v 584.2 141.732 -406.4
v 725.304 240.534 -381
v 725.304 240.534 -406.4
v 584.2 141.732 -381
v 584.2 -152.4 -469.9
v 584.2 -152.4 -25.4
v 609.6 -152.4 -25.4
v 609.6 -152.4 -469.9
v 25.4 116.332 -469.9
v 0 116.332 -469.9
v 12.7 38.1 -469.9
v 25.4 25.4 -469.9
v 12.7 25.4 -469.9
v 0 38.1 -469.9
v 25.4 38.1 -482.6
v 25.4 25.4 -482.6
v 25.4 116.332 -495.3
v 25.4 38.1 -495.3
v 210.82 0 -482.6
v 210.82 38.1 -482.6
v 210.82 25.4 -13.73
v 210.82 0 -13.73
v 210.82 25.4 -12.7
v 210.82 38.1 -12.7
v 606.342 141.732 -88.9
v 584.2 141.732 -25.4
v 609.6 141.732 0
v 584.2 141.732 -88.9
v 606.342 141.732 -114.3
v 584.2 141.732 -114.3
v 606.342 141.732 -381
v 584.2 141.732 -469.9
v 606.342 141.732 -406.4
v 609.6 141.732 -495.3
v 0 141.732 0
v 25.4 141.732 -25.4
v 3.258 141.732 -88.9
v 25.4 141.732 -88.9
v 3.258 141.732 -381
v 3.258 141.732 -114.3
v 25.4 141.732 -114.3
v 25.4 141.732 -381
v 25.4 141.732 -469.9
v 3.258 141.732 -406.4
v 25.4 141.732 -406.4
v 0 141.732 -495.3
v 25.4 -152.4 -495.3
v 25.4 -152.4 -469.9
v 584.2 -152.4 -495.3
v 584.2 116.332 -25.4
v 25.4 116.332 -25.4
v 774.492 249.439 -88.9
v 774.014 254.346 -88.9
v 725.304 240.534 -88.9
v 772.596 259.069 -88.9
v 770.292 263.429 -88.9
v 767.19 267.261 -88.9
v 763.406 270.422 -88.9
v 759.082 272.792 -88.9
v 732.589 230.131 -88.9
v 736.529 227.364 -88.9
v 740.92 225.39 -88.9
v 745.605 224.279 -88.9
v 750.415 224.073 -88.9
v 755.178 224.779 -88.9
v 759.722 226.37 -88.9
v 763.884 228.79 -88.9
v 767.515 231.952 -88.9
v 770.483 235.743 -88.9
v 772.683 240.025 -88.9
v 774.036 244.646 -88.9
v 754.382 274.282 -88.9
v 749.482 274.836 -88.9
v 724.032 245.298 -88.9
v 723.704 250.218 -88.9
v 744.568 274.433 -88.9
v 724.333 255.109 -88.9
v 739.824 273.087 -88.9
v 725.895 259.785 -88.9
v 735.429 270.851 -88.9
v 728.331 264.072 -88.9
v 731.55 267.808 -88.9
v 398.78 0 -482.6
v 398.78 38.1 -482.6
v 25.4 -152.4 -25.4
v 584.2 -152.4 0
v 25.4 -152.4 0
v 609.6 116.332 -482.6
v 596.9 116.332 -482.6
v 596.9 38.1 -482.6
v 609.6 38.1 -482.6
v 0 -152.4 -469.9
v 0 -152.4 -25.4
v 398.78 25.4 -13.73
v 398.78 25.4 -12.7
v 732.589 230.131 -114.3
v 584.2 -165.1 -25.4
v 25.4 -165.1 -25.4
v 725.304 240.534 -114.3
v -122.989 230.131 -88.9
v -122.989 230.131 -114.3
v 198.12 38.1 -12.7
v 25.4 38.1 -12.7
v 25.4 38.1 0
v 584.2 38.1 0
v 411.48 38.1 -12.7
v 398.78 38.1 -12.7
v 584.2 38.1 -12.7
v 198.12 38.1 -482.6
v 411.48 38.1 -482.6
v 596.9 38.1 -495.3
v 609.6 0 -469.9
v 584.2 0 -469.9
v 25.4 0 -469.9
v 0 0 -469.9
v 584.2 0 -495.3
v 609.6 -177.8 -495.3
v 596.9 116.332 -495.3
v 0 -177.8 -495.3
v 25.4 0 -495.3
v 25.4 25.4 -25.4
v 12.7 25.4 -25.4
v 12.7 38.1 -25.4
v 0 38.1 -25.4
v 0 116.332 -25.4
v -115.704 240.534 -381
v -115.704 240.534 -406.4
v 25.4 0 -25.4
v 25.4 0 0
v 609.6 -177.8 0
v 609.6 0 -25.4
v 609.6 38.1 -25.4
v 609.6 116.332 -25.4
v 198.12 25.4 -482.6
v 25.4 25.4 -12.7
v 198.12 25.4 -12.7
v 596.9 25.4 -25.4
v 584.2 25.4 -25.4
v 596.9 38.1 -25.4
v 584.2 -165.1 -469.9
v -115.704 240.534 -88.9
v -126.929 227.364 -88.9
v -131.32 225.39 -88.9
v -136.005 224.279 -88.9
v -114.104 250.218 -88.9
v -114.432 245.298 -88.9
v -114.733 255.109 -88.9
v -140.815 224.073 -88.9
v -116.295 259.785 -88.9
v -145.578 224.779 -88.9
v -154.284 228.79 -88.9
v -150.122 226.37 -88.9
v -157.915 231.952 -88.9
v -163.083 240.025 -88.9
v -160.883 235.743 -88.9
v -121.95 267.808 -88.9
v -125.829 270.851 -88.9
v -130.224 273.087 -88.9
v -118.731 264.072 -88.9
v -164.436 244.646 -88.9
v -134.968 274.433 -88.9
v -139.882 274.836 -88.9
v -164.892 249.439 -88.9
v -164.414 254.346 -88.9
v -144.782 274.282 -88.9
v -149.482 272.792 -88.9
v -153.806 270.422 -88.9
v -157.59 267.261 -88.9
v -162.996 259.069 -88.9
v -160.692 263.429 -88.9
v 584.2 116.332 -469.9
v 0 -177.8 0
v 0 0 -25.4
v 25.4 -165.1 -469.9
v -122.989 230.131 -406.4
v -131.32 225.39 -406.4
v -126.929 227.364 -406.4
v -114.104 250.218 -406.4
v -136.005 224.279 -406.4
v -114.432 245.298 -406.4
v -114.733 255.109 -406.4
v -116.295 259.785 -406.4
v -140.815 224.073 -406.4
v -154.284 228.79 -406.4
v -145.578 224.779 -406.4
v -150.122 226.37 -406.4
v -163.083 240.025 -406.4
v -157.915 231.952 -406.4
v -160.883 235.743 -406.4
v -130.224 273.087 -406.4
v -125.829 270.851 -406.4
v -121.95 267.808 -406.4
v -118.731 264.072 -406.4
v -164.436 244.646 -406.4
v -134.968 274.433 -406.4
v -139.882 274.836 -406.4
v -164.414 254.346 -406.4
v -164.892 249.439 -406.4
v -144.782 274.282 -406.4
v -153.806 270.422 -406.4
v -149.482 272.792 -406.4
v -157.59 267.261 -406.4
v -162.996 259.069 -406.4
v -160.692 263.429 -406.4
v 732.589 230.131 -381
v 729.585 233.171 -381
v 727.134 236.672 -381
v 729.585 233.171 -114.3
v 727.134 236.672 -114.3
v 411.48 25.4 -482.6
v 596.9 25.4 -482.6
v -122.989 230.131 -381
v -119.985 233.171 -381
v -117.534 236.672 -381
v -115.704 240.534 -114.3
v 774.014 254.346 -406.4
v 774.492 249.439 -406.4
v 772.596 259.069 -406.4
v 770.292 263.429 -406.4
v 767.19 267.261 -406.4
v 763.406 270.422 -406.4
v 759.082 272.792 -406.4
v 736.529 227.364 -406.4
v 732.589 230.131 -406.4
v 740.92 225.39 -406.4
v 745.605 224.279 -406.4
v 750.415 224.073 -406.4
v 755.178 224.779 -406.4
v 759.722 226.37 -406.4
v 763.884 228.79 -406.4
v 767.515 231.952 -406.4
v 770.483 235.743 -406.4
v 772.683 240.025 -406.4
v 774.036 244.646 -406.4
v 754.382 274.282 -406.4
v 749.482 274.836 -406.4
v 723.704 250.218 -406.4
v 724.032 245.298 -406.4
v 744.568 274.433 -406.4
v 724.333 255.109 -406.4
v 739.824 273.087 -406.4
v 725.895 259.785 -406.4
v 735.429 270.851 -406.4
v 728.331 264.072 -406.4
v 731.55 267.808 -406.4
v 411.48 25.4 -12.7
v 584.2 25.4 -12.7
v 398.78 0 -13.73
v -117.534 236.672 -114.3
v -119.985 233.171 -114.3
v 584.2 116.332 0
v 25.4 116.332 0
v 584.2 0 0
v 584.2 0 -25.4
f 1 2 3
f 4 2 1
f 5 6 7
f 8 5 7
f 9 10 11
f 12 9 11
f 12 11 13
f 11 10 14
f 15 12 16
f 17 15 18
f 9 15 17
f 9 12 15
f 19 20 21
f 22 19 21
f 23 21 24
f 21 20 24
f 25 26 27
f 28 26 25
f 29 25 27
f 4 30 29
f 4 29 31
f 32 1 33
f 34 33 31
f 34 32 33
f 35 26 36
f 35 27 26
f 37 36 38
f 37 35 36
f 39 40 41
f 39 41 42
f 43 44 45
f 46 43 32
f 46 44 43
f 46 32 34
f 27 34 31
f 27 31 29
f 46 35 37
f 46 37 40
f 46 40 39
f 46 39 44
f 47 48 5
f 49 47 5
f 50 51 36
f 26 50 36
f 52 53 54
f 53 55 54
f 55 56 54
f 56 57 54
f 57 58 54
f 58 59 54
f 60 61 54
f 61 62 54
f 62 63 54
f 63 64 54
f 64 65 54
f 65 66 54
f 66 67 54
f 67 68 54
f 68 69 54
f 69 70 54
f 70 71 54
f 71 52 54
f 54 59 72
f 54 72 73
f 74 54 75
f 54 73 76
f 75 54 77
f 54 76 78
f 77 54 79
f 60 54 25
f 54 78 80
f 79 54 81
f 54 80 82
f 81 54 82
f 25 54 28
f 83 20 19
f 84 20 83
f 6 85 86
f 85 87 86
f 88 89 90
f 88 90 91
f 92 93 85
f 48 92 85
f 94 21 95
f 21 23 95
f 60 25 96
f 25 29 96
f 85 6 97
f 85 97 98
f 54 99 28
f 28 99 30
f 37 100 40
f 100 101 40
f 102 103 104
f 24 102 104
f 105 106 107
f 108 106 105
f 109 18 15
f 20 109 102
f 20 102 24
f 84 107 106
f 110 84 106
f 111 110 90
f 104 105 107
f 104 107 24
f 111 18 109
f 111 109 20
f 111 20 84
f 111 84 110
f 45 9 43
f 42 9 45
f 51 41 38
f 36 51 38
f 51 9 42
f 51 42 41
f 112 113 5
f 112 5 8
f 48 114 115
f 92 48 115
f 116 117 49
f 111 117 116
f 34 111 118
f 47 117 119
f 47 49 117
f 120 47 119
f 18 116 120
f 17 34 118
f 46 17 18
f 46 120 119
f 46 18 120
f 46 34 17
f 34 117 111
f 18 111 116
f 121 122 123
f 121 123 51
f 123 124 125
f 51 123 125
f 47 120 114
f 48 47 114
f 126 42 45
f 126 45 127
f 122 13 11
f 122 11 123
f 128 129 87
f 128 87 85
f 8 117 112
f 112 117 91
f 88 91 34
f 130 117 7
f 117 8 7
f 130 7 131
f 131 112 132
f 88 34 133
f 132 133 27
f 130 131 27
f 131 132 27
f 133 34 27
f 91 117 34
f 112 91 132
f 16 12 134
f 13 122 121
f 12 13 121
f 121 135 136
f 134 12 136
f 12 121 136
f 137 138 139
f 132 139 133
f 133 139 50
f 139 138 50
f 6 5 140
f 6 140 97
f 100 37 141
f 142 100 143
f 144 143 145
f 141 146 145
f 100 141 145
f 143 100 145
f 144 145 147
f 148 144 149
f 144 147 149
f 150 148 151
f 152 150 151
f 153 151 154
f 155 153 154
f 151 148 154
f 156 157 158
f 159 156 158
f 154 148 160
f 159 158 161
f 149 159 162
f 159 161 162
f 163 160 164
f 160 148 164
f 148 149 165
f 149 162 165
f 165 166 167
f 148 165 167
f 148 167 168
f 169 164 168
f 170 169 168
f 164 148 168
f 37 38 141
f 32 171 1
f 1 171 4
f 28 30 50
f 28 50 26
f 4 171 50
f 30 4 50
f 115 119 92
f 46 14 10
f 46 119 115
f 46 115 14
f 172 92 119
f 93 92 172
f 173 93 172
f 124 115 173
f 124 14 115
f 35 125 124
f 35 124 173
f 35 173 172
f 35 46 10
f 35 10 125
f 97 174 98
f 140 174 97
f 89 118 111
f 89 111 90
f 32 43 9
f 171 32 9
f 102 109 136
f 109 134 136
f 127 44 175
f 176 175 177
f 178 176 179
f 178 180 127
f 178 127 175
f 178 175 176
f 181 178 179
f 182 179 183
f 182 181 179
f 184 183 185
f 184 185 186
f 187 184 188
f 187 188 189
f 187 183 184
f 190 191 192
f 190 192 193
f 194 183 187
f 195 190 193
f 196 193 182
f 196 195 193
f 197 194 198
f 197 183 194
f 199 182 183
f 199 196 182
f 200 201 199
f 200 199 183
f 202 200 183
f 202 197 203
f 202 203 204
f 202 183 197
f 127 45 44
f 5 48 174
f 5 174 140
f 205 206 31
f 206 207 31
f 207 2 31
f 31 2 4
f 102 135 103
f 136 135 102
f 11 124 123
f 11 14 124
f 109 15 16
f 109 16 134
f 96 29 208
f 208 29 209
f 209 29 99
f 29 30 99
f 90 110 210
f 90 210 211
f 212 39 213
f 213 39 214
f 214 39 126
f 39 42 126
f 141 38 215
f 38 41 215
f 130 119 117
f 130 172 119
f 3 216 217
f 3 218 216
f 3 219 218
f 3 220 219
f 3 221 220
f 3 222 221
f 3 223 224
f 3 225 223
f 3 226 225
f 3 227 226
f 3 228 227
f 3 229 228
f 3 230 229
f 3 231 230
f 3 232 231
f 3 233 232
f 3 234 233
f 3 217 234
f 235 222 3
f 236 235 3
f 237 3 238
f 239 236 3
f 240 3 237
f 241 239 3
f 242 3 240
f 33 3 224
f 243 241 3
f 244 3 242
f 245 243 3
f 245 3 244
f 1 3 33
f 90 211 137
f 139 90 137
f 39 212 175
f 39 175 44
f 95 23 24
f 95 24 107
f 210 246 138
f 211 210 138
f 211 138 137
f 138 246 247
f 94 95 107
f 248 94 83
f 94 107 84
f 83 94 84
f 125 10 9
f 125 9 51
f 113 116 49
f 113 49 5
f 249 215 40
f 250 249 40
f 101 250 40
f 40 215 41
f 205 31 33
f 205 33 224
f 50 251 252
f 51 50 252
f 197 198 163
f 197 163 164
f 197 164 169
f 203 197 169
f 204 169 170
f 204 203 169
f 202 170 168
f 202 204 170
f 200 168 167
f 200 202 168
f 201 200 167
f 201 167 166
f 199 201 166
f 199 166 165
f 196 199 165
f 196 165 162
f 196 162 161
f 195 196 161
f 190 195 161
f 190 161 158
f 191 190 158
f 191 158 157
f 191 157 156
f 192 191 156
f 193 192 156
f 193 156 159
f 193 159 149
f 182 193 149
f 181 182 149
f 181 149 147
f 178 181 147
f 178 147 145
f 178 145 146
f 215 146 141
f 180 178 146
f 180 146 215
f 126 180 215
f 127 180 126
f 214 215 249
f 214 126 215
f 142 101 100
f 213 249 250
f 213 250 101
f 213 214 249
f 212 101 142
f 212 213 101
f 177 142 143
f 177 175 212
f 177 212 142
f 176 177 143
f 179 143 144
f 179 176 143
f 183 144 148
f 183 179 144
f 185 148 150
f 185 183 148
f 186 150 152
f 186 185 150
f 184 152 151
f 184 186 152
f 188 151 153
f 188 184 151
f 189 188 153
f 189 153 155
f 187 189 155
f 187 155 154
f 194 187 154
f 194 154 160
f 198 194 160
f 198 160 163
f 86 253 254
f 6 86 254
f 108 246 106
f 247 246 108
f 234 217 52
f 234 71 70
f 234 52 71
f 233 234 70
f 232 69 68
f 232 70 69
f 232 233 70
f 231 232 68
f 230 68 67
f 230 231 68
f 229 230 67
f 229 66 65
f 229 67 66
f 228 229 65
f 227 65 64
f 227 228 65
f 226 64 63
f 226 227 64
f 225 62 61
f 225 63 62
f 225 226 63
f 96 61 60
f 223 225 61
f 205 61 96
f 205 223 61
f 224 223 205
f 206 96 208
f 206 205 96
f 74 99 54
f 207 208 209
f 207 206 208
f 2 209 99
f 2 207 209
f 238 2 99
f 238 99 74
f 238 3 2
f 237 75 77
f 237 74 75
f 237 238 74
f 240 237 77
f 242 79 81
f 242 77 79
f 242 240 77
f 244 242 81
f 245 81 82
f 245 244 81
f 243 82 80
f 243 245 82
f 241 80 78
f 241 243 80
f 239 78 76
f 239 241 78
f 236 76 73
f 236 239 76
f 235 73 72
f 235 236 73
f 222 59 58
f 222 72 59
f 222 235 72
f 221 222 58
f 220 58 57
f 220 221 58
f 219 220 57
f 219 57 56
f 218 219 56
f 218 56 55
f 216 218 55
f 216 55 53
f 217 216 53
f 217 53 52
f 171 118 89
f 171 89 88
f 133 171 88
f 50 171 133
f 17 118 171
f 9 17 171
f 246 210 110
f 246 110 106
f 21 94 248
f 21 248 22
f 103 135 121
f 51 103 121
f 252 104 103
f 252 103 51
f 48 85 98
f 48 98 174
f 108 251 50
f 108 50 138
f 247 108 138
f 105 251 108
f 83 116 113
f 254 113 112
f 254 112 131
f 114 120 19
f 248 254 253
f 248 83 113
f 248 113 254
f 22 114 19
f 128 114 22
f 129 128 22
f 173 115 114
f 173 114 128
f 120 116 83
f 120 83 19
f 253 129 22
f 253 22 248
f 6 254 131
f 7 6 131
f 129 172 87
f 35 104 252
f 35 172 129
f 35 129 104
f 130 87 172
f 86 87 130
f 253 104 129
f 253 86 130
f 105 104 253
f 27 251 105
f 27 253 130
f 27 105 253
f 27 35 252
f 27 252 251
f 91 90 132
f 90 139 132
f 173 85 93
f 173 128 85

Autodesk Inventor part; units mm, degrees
sketch "Sketch1" plane through (0, 0, 0) normal (1, 0, 0) x (0, 1, 0)
  line L0 (0, 0) -> (141.732, 0)
  line L1 (141.732, 0) -> (141.732, -495.3)
  line L2 (141.732, -495.3) -> (0, -495.3)
  line L3 (0, -495.3) -> (0, 0)
  dimension "d0" = 495.3
  dimension "d1" = 141.732
extrude "Extrusion1" add sketch "Sketch1" along normal blind 609.6
shell "Shell1" thickness 25.4 removed faces 1 at (203.2, 141.732, -165.1)
sketch "Sketch2" plane through (0, 0, 0) normal (0, 0, 1) x (1, 0, 0)
  line L0 (25.4, 25.4) -> (25.4, 141.732) projected
  line L1 (584.2, 141.732) -> (584.2, 25.4) projected
  line L2 (25.4, 25.4) -> (584.2, 25.4)
  line L3 (584.2, 25.4) -> (584.2, 116.332)
  line L4 (584.2, 116.332) -> (25.4, 116.332)
  line L5 (25.4, 116.332) -> (25.4, 25.4)
  point P0 (0, 0)
  dimension "d5" = 90.932
sketch "Sketch4" plane through (0, 0, 0) normal (-1, 0, 0) x (0, 0, 1)
  line L0 (-25.4, 141.732) -> (-25.4, 25.4) projected
  line L1 (-469.9, 25.4) -> (-469.9, 141.732) projected
  line L2 (-25.4, 25.4) -> (-469.9, 25.4)
  line L3 (-469.9, 25.4) -> (-469.9, 116.332)
  line L4 (-469.9, 116.332) -> (-25.4, 116.332)
  line L5 (-25.4, 116.332) -> (-25.4, 25.4)
  point P0 (0, 0)
  dimension "d13" = 90.932
extrude "Extrusion6" cut sketch "Sketch4" against normal through all
extrude "Extrusion7" cut sketch "Sketch2" against normal through all
sketch "Sketch9" plane through (609.6, 25.4, -25.4) normal (0, 1, 0) x (1, 0, 0)
  line L0 (-609.6, -25.4) -> (-609.6, 469.9) projected
  line L1 (-609.6, 469.9) -> (0, 469.9) projected
  line L2 (0, 469.9) -> (0, -25.4) projected
  line L3 (-609.6, -25.4) -> (0, -25.4) projected
  line L4 (-609.6, 444.5) -> (-584.2, 444.5) projected
  line L5 (-596.9, 444.5) -> (-596.9, 0)
  line L6 (-609.6, 0) -> (-584.2, 0) projected
  line L7 (-584.2, 444.5) -> (-584.2, 469.9) projected
  line L8 (-584.2, 457.2) -> (-25.4, 457.2)
  line L9 (-25.4, 444.5) -> (-25.4, 469.9) projected
  line L10 (-25.4, 444.5) -> (0, 444.5) projected
  line L11 (-12.7, 444.5) -> (-12.7, 0)
  line L12 (-25.4, 0) -> (0, 0) projected
  line L13 (-584.2, -25.4) -> (-584.2, 0) projected
  line L14 (-584.2, -12.7) -> (-25.4, -12.7)
  line L15 (-25.4, -25.4) -> (-25.4, 0) projected
  line L16 (-609.6, 444.5) -> (-584.2, 444.5) projected
  line L17 (-596.9, 444.5) -> (-609.6, 444.5)
  line L18 (-609.6, 0) -> (-596.9, 0)
  line L19 (-609.6, 0) -> (-584.2, 0) projected
  line L20 (-25.4, 457.2) -> (-25.4, 469.9)
  line L21 (-609.6, 469.9) -> (0, 469.9) projected
  line L22 (-25.4, 444.5) -> (0, 444.5) projected
  line L23 (-12.7, 444.5) -> (0, 444.5)
  line L24 (-25.4, 457.2) -> (-25.4, 469.9)
  line L25 (-25.4, 0) -> (0, 0) projected
  line L26 (-12.7, 0) -> (0, 0)
  line L27 (-25.4, -12.7) -> (-25.4, -25.4)
  line L28 (-25.4, -25.4) -> (-584.2, -25.4) projected
  line L29 (-584.2, -25.4) -> (-584.2, -12.7)
  line L30 (-609.6, 444.5) -> (-609.6, 0)
  line L31 (-609.6, 469.9) -> (-609.6, -25.4) projected
  line L32 (-584.2, -25.4) -> (-25.4, -25.4)
  line L33 (-584.2, 469.9) -> (-25.4, 469.9) projected
  line L34 (-25.4, 469.9) -> (-584.2, 469.9)
  line L35 (0, 444.5) -> (0, 0) projected
  line L36 (0, 444.5) -> (0, 0)
extrude "Extrusion14" add sketch "Sketch9" along normal blind 12.7 contours L0 L4 L5 L6 | L13 L14 L15 L3 | L0 L1 L7 L4 | L1 L9 L8 L7 | L12 L11 L10 L2 | L1 L2 L10 L9
sketch "Sketch10" plane through (0, 0, -495.3) normal (0, -1, 0) x (1, 0, 0)
  line L0 (25.4, 469.9) -> (25.4, 25.4) projected
  line L1 (0, 495.3) -> (25.4, 495.3)
  line L2 (25.4, 495.3) -> (25.4, 469.9)
  line L3 (25.4, 469.9) -> (0, 469.9)
  line L4 (0, 469.9) -> (0, 495.3)
  line L5 (25.4, 25.4) -> (0, 25.4)
  line L6 (0, 25.4) -> (0, 0)
  line L7 (0, 0) -> (25.4, 0)
  line L8 (25.4, 0) -> (25.4, 25.4)
  line L9 (609.6, 0) -> (609.6, 495.3) projected
  line L10 (609.6, 0) -> (584.2, 0)
  line L11 (584.2, 0) -> (584.2, 25.4)
  line L12 (584.2, 25.4) -> (609.6, 25.4)
  line L13 (609.6, 25.4) -> (609.6, 0)
  line L14 (584.2, 469.9) -> (25.4, 469.9) projected
  line L15 (609.6, 495.3) -> (584.2, 495.3)
  line L16 (584.2, 495.3) -> (584.2, 469.9)
  line L17 (584.2, 469.9) -> (609.6, 469.9)
  line L18 (609.6, 469.9) -> (609.6, 495.3)
  dimension "d48" = 25.4
  dimension "d49" = 25.4
  dimension "d50" = 25.4
  dimension "d51" = 25.4
  dimension "d52" = 25.4
  dimension "d53" = 25.4
  dimension "d54" = 25.4
  dimension "d55" = 25.4
extrude "Extrusion15" add sketch "Sketch10" along normal blind 152.4
sketch "Sketch11" plane through (0, -152.4, -495.3) normal (0, -1, 0) x (1, 0, 0)
  line L0 (609.6, 0) -> (609.6, 25.4) projected
  line L1 (0, 495.3) -> (609.6, 495.3)
  line L2 (609.6, 495.3) -> (609.6, 0)
  line L3 (609.6, 0) -> (0, 0)
  line L4 (0, 0) -> (0, 495.3)
extrude "Extrusion16" add sketch "Sketch11" along normal blind 25.4
sketch "Sketch12" plane through (25.4, 25.4, -12.7) normal (0, 1, 0) x (1, 0, 0)
  line L0 (185.42, 457.2) -> (185.42, 12.7)
  line L1 (373.38, 457.2) -> (373.38, 12.7)
  line L2 (373.38, 457.2) -> (373.38, 12.7)
  line L3 (185.42, 12.7) -> (185.42, 457.2)
  line L4 (373.38, 457.2) -> (373.38, 469.9)
  line L5 (185.42, 469.9) -> (185.42, 457.2)
  line L6 (185.42, 12.7) -> (185.42, 1.0295)
  line L7 (373.38, 1.0295) -> (373.38, 12.7)
  line L8 (185.42, 469.9) -> (373.38, 469.9)
  line L9 (373.38, 469.9) -> (373.38, 1.0295)
  line L10 (373.38, 1.0295) -> (185.42, 1.0295)
  line L11 (185.42, 1.0295) -> (185.42, 469.9)
  line L12 (558.8, 0) -> (0, 0) projected
  line L13 (185.42, 469.9) -> (172.72, 469.9)
  line L14 (172.72, 469.9) -> (172.72, 0)
  line L15 (172.72, 0) -> (185.42, 0)
  line L16 (185.42, 0) -> (185.42, 469.9)
  line L17 (373.38, 469.9) -> (386.08, 469.9)
  line L18 (386.08, 469.9) -> (386.08, -5.7755)
  line L19 (386.08, -5.7755) -> (373.38, -5.7755)
  line L20 (373.38, -5.7755) -> (373.38, 469.9)
  dimension "d64" = 12.7
  dimension "d65" = 12.7
extrude "Extrusion17" cut sketch "Sketch12" against normal blind 25.4 contours L5 L8 L4 L1 L7 L10 L6 L0
extrude "Extrusion18" add sketch "Sketch12" along normal blind 12.7 contours L0 L6 L16 L12 L14 L13 L5 | L17 L18 L12 L20 L7 L1 L4 | L12 L18 L19 L20
sketch "Sketch13" plane through (0, -152.4, -495.3) normal (0, 1, 0) x (1, 0, 0)
  line L0 (609.6, -495.3) -> (0, -495.3) projected
  line L1 (609.6, 0) -> (609.6, -495.3) projected
  line L2 (0, -495.3) -> (0, 0) projected
  line L3 (0, 0) -> (609.6, 0) projected
  line L4 (584.2, -25.4) -> (584.2, -469.9)
  line L5 (584.2, -469.9) -> (25.4, -469.9)
  line L6 (25.4, -469.9) -> (25.4, -25.4)
  line L7 (25.4, -25.4) -> (584.2, -25.4)
  dimension "d68" = 25.4
extrude "Extrusion19" cut sketch "Sketch13" against normal blind 12.7 contours L4 L5 L6 L7
ref_plane "Work Plane1" through (609.6, 141.732, -393.7) normal (0, 0, -1) x (-1, 0, 0)
ref_plane "Work Plane2" through (0, 141.732, -101.6) normal (0, 0, 1) x (1, 0, 0)
sketch "Sketch14" plane through (0, 141.732, -101.6) normal (0, 0, 1) x (1, 0, 0)
  line L0 (584.2, 0) -> (25.4, 0) projected
  line L1 (16.946, -12.0735) -> (25.4, 0)
  line L2 (25.4, 0) -> (228.6, 0) construction
  line L3 (25.4, 0) -> (-141.0517, 116.5507)
  line L4 (-141.0517, 116.5507) -> (-148.3361, 106.1475)
  line L5 (-148.3361, 106.1475) -> (18.1156, -10.4032)
  line L6 (18.1156, -10.4032) -> (25.4, 0)
  line L7 (25.4, 0) -> (228.6, 0) construction
  point P0 (0, -141.732)
  dimension "d75" = 203.2
  dimension "d76" = 145
  dimension "d77" = 12.7
sketch "Sketch15" plane through (609.6, 141.732, -393.7) normal (0, 0, -1) x (-1, 0, 0)
  line L0 (584.2, 0) -> (750.6517, 116.5507) projected
  line L1 (757.9361, 106.1475) -> (591.4844, -10.4032) projected
  line L2 (750.6517, 116.5507) -> (757.9361, 106.1475) projected
  line L3 (584.2, 0) -> (750.6517, 116.5507)
  line L4 (750.6517, 116.5507) -> (757.9361, 106.1475)
  line L5 (757.9361, 106.1475) -> (591.4844, -10.4032)
  line L6 (591.4844, -10.4032) -> (584.2, 0)
  point P0 (609.6, -141.732)
extrude "Extrusion20" add sketch "Sketch15" along normal mid plane 25.4
extrude "Extrusion21" add sketch "Sketch14" along normal mid plane 25.4
ref_plane "Work Plane3" through (304.8, 0, 0) normal (1, 0, 0) x (0, 0, -1)
sketch "Sketch16" plane through (609.6, 141.732, -406.4) normal (0, 0, -1) x (-1, 0, 0)
  circle A0 centre (749.0923, 107.7069) radius 25.4
  point P0 (609.6, -141.732)
  point P1 (750.6517, 116.5507)
  point P2 (757.9361, 106.1475)
extrude "Extrusion24" add sketch "Sketch16" against normal up to surface (317.5 mm away)
mirror "Mirror2" about plane through (304.8, 0, 0) normal (1, 0, 0) of "Extrusion24", "Extrusion21", "Extrusion20"
sketch "Sketch17" plane through (584.2, 116.332, -469.9) normal (0, 0, 1) x (1, 0, 0)
  line L0 (12.7, -78.232) -> (25.4, -78.232) projected
  line L1 (25.4, 0) -> (25.4, -78.232) projected
  line L2 (0, 0) -> (25.4, 0) projected
  line L3 (0, 0) -> (0, -90.932) projected
  line L4 (0, -90.932) -> (12.7, -90.932) projected
  line L5 (12.7, -90.932) -> (12.7, -78.232) projected
  point P0 (-584.2, -116.332)
extrude "Extrusion25" cut sketch "Sketch17" against normal blind 12.7
sketch "Sketch18" plane through (584.2, 38.1, -482.6) normal (-1, 0, 0) x (0, 0, 1)
  line L0 (0, 0) -> (0, 78.232) projected
  line L1 (0, 78.232) -> (-12.7, 78.232) projected
  line L2 (-12.7, 0) -> (-12.7, 78.232) projected
  line L3 (-12.7, 0) -> (0, 0) projected
  point P0 (482.6, -38.1)
extrude "Extrusion26" cut sketch "Sketch18" against normal blind 12.7
properties part number "Battery Cart"
